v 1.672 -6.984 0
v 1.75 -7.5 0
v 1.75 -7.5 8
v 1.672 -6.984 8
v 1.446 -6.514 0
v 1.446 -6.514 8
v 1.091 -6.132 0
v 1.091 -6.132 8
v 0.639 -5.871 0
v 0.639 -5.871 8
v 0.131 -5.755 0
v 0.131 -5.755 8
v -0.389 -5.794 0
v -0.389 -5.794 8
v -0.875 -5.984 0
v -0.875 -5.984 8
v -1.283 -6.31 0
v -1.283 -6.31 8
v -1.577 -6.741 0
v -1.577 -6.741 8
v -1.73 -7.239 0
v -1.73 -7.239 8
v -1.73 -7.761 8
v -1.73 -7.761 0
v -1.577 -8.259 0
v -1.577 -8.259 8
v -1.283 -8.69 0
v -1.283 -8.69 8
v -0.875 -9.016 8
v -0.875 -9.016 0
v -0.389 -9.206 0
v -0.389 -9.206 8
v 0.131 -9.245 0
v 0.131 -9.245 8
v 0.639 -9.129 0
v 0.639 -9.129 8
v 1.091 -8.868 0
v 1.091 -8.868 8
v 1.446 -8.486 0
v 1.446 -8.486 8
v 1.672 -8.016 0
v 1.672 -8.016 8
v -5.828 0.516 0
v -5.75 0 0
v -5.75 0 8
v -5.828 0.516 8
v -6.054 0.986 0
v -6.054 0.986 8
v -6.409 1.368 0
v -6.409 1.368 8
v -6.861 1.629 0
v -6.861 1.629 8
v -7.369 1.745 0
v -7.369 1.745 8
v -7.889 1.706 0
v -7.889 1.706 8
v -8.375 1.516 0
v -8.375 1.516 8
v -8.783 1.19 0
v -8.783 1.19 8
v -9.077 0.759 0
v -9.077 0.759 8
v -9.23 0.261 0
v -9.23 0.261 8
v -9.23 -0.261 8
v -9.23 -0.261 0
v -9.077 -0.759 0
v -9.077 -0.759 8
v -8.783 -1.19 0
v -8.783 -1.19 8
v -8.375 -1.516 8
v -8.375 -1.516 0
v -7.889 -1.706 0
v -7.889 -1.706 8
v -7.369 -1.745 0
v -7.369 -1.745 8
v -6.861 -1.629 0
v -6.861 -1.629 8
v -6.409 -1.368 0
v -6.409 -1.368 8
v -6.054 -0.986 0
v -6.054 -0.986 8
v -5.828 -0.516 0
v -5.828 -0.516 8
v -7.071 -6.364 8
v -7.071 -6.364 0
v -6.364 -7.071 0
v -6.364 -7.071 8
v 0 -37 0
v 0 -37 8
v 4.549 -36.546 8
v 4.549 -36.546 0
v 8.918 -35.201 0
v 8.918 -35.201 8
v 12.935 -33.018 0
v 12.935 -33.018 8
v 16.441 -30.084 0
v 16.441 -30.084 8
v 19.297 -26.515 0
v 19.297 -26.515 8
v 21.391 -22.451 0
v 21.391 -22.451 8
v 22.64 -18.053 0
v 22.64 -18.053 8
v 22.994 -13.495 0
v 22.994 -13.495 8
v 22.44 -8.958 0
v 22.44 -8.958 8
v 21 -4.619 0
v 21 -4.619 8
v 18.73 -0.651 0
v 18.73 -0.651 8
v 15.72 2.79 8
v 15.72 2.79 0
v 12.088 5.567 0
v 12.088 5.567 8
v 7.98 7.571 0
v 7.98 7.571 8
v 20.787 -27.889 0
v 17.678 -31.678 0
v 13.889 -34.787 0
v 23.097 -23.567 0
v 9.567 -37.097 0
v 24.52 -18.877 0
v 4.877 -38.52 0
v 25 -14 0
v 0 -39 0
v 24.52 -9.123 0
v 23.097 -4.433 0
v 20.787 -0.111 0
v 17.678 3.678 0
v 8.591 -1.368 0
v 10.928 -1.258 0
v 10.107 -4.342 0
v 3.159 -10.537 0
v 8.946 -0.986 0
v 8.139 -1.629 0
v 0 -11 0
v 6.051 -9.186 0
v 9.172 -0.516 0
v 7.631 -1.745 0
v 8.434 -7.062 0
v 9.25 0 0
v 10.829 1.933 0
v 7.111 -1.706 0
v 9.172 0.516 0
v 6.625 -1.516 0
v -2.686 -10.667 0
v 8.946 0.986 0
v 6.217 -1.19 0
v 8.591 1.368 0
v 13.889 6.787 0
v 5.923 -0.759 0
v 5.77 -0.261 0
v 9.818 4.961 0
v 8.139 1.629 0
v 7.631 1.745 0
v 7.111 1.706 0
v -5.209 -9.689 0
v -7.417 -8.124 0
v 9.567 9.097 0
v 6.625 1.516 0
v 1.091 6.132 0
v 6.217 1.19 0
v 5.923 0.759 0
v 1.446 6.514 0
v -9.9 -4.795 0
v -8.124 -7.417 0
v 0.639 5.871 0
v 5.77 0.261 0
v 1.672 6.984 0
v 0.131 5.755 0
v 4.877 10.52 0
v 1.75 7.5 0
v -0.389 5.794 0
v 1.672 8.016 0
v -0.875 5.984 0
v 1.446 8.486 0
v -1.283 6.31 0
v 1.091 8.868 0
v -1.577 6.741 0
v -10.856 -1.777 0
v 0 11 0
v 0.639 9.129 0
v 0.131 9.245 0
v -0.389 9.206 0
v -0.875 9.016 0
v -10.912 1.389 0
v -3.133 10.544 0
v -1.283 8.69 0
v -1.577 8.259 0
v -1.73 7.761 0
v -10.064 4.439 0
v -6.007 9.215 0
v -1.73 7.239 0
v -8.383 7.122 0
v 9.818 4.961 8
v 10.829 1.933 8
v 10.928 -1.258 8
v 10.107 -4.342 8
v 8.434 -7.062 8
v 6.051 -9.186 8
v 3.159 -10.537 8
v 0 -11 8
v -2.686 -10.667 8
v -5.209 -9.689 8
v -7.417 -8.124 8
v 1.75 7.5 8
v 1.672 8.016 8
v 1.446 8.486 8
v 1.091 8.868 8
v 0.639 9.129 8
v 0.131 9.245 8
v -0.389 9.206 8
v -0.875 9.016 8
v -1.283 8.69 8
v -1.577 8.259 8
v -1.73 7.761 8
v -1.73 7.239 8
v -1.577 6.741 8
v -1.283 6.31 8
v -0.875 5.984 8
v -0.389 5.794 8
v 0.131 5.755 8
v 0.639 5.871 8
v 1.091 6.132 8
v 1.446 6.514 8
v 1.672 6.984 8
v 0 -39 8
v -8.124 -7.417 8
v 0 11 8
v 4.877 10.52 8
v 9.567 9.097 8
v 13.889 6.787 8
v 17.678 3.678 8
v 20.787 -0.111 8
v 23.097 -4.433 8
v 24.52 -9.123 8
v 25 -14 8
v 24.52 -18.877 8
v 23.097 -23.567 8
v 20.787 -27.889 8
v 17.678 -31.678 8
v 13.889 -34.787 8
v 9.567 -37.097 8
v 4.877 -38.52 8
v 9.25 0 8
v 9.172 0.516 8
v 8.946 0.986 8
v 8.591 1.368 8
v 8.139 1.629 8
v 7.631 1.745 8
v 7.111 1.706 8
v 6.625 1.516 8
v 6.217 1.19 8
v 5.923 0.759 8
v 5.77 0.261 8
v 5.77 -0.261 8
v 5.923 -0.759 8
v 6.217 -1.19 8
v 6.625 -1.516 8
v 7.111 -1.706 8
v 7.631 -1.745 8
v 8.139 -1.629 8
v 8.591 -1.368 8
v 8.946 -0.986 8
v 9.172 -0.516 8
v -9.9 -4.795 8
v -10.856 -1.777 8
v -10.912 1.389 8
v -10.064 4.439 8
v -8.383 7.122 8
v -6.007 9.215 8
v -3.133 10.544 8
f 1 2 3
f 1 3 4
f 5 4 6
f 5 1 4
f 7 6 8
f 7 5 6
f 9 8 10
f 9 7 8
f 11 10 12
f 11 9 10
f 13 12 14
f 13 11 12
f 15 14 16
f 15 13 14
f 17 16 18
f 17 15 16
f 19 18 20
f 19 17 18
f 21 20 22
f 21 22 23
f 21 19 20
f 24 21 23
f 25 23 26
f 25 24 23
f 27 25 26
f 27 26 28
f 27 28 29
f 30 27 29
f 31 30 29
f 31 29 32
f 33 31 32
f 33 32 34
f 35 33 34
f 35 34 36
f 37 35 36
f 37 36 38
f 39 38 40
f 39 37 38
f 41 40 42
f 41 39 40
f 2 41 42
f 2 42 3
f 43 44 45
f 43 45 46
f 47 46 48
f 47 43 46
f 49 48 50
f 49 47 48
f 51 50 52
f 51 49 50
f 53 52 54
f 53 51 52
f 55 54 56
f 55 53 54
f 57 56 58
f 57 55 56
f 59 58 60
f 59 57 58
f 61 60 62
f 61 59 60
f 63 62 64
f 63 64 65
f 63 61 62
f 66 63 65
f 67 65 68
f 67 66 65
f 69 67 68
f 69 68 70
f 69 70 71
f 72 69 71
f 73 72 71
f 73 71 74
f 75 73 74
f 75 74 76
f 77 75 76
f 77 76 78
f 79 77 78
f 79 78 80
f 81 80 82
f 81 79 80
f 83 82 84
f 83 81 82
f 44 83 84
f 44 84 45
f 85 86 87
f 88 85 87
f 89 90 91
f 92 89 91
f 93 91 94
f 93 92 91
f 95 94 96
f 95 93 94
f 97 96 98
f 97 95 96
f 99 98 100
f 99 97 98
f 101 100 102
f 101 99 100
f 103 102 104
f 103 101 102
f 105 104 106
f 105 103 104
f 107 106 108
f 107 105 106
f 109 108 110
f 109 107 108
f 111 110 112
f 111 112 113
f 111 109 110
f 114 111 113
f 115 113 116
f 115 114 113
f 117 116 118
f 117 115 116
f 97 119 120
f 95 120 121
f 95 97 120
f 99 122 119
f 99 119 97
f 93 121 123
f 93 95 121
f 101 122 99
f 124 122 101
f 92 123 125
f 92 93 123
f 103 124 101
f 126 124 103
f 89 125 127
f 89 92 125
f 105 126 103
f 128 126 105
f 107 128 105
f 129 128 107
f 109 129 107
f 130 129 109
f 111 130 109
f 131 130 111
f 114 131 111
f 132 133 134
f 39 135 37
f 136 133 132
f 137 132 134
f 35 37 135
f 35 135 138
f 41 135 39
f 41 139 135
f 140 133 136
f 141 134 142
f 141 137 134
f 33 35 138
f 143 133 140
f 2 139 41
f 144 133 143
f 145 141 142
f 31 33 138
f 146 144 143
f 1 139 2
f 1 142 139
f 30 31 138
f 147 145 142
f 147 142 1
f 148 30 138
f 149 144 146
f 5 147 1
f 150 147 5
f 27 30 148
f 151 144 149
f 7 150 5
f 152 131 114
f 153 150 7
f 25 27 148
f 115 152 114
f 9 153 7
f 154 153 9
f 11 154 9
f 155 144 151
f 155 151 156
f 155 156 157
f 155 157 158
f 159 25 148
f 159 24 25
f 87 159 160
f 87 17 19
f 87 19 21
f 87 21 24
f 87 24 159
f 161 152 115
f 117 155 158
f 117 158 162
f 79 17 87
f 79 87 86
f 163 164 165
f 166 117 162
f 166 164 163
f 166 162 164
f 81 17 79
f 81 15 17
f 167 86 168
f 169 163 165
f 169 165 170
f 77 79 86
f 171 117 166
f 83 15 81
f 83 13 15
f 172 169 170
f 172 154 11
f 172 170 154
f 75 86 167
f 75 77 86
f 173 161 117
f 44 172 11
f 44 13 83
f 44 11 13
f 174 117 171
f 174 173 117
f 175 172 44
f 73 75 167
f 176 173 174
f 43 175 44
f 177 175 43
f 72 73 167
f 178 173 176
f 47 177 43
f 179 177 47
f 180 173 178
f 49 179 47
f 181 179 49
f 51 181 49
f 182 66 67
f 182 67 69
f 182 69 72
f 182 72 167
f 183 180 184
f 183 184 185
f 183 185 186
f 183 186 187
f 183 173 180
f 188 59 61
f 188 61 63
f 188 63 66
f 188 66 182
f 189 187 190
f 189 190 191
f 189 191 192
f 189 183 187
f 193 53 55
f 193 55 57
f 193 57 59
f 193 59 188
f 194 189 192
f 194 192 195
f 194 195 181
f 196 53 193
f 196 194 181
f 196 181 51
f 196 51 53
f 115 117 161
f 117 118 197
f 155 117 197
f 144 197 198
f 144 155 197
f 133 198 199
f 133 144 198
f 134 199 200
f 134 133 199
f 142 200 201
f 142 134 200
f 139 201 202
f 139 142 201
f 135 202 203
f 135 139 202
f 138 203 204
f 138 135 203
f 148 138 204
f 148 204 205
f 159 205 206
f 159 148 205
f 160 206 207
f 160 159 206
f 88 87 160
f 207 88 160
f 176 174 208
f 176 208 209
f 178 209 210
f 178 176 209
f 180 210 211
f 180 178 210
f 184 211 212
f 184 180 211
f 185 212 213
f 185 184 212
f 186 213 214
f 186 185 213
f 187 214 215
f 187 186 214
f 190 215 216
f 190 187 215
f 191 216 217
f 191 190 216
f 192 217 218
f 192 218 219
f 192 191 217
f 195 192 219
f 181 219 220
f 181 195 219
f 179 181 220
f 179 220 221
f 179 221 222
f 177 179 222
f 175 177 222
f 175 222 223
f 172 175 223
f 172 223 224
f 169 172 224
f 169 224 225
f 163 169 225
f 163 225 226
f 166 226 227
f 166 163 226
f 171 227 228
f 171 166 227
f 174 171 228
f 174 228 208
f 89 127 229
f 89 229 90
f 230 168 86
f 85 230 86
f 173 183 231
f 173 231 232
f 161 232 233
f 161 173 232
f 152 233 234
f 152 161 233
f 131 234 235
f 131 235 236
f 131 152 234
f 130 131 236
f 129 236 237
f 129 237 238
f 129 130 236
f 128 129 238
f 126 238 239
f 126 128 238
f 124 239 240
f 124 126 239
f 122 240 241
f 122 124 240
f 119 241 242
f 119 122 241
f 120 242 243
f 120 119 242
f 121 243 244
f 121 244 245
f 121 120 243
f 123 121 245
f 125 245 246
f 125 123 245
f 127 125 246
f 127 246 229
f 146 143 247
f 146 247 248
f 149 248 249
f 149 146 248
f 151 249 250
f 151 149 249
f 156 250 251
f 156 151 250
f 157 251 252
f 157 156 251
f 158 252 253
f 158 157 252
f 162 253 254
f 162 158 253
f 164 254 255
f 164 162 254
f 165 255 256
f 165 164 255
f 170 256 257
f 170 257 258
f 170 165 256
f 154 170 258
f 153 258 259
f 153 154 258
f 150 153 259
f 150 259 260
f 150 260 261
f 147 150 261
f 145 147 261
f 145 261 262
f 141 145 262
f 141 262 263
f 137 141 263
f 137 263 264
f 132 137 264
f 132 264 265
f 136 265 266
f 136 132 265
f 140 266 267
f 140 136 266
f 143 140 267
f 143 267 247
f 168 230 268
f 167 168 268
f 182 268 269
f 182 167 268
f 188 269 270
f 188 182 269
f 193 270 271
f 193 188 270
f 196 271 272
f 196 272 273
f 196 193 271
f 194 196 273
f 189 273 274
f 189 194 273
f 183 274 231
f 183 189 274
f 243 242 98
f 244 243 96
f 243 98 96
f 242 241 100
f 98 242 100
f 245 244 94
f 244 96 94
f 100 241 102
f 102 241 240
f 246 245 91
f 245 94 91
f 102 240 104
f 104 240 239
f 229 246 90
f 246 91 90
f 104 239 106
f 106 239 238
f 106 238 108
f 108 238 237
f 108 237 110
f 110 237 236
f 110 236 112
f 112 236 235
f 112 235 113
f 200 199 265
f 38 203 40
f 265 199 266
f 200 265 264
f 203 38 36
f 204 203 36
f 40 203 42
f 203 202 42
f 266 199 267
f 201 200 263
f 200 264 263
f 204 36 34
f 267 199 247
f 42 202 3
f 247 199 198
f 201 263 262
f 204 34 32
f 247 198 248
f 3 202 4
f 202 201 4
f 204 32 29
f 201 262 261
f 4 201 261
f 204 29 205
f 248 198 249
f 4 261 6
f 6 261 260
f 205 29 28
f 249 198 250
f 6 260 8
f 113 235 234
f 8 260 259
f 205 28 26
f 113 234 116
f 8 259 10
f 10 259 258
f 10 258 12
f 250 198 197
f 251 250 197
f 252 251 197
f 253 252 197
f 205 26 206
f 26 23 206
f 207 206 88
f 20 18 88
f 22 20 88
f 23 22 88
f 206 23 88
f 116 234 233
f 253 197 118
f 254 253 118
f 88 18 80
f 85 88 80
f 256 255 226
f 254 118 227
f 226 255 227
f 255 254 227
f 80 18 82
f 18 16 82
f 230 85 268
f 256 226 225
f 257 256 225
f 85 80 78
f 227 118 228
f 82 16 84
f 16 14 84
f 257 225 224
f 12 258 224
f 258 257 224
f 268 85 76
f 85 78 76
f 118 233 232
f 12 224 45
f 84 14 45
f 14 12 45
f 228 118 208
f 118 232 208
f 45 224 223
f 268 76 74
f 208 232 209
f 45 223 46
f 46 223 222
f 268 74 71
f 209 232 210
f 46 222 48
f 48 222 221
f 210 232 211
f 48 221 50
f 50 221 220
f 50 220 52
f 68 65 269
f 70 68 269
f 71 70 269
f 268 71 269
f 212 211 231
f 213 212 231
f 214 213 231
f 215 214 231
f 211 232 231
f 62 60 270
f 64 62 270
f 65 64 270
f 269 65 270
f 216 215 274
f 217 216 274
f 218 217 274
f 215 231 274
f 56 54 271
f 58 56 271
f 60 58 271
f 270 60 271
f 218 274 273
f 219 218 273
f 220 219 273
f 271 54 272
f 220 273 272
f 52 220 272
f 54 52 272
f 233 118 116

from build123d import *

# Parameters (mm, degrees)
SKETCH1_R               = 1.75
BOSS_EXTRUDE1_DEPTH     = 8
CUT_EXTRUDE1_DEPTH      = 48.010637094
CUT_EXTRUDE1_DEPTH_BACK = 48.010637094


with BuildPart() as part:
    # Sketch1 → Boss-Extrude1 (new body)
    with BuildSketch(Plane.XY):
        with BuildLine():
            Line((0, -39), (0, -37))
            ThreePointArc((0, -37), (22.640040384, -18.053217417), (7.979565739, 7.571428571))
            ThreePointArc((7.979565739, 7.571428571), (10.106574946, -4.342481187), (0, -11))
            ThreePointArc((0, -11), (-11, 0), (0, 11))
            ThreePointArc((0, 11), (25, -14), (0, -39))
        make_face()
        with Locations((0, 7.5)):
            Circle(SKETCH1_R, mode=Mode.SUBTRACT)
        with Locations((-7.5, 0)):
            Circle(SKETCH1_R, mode=Mode.SUBTRACT)
        with Locations((0, -7.5)):
            Circle(SKETCH1_R, mode=Mode.SUBTRACT)
        with Locations((7.5, 0)):
            Circle(SKETCH1_R, mode=Mode.SUBTRACT)
    extrude(amount=BOSS_EXTRUDE1_DEPTH)

    # Sketch2 → Cut-Extrude1 (cut, two sides: drawn at the far end of the back side and taken through both)
    with BuildSketch(Plane(origin=(0, 0, 0), x_dir=(-1, 0, 0), z_dir=(0, 0, -1)).offset(-CUT_EXTRUDE1_DEPTH_BACK)):
        Polygon((9.192388155, -8.485281374), (7.071067812, -6.363961031), (6.363961031, -7.071067812), (8.485281374, -9.192388155), align=None)
    extrude(amount=CUT_EXTRUDE1_DEPTH + CUT_EXTRUDE1_DEPTH_BACK, mode=Mode.SUBTRACT)


solid = part.part
